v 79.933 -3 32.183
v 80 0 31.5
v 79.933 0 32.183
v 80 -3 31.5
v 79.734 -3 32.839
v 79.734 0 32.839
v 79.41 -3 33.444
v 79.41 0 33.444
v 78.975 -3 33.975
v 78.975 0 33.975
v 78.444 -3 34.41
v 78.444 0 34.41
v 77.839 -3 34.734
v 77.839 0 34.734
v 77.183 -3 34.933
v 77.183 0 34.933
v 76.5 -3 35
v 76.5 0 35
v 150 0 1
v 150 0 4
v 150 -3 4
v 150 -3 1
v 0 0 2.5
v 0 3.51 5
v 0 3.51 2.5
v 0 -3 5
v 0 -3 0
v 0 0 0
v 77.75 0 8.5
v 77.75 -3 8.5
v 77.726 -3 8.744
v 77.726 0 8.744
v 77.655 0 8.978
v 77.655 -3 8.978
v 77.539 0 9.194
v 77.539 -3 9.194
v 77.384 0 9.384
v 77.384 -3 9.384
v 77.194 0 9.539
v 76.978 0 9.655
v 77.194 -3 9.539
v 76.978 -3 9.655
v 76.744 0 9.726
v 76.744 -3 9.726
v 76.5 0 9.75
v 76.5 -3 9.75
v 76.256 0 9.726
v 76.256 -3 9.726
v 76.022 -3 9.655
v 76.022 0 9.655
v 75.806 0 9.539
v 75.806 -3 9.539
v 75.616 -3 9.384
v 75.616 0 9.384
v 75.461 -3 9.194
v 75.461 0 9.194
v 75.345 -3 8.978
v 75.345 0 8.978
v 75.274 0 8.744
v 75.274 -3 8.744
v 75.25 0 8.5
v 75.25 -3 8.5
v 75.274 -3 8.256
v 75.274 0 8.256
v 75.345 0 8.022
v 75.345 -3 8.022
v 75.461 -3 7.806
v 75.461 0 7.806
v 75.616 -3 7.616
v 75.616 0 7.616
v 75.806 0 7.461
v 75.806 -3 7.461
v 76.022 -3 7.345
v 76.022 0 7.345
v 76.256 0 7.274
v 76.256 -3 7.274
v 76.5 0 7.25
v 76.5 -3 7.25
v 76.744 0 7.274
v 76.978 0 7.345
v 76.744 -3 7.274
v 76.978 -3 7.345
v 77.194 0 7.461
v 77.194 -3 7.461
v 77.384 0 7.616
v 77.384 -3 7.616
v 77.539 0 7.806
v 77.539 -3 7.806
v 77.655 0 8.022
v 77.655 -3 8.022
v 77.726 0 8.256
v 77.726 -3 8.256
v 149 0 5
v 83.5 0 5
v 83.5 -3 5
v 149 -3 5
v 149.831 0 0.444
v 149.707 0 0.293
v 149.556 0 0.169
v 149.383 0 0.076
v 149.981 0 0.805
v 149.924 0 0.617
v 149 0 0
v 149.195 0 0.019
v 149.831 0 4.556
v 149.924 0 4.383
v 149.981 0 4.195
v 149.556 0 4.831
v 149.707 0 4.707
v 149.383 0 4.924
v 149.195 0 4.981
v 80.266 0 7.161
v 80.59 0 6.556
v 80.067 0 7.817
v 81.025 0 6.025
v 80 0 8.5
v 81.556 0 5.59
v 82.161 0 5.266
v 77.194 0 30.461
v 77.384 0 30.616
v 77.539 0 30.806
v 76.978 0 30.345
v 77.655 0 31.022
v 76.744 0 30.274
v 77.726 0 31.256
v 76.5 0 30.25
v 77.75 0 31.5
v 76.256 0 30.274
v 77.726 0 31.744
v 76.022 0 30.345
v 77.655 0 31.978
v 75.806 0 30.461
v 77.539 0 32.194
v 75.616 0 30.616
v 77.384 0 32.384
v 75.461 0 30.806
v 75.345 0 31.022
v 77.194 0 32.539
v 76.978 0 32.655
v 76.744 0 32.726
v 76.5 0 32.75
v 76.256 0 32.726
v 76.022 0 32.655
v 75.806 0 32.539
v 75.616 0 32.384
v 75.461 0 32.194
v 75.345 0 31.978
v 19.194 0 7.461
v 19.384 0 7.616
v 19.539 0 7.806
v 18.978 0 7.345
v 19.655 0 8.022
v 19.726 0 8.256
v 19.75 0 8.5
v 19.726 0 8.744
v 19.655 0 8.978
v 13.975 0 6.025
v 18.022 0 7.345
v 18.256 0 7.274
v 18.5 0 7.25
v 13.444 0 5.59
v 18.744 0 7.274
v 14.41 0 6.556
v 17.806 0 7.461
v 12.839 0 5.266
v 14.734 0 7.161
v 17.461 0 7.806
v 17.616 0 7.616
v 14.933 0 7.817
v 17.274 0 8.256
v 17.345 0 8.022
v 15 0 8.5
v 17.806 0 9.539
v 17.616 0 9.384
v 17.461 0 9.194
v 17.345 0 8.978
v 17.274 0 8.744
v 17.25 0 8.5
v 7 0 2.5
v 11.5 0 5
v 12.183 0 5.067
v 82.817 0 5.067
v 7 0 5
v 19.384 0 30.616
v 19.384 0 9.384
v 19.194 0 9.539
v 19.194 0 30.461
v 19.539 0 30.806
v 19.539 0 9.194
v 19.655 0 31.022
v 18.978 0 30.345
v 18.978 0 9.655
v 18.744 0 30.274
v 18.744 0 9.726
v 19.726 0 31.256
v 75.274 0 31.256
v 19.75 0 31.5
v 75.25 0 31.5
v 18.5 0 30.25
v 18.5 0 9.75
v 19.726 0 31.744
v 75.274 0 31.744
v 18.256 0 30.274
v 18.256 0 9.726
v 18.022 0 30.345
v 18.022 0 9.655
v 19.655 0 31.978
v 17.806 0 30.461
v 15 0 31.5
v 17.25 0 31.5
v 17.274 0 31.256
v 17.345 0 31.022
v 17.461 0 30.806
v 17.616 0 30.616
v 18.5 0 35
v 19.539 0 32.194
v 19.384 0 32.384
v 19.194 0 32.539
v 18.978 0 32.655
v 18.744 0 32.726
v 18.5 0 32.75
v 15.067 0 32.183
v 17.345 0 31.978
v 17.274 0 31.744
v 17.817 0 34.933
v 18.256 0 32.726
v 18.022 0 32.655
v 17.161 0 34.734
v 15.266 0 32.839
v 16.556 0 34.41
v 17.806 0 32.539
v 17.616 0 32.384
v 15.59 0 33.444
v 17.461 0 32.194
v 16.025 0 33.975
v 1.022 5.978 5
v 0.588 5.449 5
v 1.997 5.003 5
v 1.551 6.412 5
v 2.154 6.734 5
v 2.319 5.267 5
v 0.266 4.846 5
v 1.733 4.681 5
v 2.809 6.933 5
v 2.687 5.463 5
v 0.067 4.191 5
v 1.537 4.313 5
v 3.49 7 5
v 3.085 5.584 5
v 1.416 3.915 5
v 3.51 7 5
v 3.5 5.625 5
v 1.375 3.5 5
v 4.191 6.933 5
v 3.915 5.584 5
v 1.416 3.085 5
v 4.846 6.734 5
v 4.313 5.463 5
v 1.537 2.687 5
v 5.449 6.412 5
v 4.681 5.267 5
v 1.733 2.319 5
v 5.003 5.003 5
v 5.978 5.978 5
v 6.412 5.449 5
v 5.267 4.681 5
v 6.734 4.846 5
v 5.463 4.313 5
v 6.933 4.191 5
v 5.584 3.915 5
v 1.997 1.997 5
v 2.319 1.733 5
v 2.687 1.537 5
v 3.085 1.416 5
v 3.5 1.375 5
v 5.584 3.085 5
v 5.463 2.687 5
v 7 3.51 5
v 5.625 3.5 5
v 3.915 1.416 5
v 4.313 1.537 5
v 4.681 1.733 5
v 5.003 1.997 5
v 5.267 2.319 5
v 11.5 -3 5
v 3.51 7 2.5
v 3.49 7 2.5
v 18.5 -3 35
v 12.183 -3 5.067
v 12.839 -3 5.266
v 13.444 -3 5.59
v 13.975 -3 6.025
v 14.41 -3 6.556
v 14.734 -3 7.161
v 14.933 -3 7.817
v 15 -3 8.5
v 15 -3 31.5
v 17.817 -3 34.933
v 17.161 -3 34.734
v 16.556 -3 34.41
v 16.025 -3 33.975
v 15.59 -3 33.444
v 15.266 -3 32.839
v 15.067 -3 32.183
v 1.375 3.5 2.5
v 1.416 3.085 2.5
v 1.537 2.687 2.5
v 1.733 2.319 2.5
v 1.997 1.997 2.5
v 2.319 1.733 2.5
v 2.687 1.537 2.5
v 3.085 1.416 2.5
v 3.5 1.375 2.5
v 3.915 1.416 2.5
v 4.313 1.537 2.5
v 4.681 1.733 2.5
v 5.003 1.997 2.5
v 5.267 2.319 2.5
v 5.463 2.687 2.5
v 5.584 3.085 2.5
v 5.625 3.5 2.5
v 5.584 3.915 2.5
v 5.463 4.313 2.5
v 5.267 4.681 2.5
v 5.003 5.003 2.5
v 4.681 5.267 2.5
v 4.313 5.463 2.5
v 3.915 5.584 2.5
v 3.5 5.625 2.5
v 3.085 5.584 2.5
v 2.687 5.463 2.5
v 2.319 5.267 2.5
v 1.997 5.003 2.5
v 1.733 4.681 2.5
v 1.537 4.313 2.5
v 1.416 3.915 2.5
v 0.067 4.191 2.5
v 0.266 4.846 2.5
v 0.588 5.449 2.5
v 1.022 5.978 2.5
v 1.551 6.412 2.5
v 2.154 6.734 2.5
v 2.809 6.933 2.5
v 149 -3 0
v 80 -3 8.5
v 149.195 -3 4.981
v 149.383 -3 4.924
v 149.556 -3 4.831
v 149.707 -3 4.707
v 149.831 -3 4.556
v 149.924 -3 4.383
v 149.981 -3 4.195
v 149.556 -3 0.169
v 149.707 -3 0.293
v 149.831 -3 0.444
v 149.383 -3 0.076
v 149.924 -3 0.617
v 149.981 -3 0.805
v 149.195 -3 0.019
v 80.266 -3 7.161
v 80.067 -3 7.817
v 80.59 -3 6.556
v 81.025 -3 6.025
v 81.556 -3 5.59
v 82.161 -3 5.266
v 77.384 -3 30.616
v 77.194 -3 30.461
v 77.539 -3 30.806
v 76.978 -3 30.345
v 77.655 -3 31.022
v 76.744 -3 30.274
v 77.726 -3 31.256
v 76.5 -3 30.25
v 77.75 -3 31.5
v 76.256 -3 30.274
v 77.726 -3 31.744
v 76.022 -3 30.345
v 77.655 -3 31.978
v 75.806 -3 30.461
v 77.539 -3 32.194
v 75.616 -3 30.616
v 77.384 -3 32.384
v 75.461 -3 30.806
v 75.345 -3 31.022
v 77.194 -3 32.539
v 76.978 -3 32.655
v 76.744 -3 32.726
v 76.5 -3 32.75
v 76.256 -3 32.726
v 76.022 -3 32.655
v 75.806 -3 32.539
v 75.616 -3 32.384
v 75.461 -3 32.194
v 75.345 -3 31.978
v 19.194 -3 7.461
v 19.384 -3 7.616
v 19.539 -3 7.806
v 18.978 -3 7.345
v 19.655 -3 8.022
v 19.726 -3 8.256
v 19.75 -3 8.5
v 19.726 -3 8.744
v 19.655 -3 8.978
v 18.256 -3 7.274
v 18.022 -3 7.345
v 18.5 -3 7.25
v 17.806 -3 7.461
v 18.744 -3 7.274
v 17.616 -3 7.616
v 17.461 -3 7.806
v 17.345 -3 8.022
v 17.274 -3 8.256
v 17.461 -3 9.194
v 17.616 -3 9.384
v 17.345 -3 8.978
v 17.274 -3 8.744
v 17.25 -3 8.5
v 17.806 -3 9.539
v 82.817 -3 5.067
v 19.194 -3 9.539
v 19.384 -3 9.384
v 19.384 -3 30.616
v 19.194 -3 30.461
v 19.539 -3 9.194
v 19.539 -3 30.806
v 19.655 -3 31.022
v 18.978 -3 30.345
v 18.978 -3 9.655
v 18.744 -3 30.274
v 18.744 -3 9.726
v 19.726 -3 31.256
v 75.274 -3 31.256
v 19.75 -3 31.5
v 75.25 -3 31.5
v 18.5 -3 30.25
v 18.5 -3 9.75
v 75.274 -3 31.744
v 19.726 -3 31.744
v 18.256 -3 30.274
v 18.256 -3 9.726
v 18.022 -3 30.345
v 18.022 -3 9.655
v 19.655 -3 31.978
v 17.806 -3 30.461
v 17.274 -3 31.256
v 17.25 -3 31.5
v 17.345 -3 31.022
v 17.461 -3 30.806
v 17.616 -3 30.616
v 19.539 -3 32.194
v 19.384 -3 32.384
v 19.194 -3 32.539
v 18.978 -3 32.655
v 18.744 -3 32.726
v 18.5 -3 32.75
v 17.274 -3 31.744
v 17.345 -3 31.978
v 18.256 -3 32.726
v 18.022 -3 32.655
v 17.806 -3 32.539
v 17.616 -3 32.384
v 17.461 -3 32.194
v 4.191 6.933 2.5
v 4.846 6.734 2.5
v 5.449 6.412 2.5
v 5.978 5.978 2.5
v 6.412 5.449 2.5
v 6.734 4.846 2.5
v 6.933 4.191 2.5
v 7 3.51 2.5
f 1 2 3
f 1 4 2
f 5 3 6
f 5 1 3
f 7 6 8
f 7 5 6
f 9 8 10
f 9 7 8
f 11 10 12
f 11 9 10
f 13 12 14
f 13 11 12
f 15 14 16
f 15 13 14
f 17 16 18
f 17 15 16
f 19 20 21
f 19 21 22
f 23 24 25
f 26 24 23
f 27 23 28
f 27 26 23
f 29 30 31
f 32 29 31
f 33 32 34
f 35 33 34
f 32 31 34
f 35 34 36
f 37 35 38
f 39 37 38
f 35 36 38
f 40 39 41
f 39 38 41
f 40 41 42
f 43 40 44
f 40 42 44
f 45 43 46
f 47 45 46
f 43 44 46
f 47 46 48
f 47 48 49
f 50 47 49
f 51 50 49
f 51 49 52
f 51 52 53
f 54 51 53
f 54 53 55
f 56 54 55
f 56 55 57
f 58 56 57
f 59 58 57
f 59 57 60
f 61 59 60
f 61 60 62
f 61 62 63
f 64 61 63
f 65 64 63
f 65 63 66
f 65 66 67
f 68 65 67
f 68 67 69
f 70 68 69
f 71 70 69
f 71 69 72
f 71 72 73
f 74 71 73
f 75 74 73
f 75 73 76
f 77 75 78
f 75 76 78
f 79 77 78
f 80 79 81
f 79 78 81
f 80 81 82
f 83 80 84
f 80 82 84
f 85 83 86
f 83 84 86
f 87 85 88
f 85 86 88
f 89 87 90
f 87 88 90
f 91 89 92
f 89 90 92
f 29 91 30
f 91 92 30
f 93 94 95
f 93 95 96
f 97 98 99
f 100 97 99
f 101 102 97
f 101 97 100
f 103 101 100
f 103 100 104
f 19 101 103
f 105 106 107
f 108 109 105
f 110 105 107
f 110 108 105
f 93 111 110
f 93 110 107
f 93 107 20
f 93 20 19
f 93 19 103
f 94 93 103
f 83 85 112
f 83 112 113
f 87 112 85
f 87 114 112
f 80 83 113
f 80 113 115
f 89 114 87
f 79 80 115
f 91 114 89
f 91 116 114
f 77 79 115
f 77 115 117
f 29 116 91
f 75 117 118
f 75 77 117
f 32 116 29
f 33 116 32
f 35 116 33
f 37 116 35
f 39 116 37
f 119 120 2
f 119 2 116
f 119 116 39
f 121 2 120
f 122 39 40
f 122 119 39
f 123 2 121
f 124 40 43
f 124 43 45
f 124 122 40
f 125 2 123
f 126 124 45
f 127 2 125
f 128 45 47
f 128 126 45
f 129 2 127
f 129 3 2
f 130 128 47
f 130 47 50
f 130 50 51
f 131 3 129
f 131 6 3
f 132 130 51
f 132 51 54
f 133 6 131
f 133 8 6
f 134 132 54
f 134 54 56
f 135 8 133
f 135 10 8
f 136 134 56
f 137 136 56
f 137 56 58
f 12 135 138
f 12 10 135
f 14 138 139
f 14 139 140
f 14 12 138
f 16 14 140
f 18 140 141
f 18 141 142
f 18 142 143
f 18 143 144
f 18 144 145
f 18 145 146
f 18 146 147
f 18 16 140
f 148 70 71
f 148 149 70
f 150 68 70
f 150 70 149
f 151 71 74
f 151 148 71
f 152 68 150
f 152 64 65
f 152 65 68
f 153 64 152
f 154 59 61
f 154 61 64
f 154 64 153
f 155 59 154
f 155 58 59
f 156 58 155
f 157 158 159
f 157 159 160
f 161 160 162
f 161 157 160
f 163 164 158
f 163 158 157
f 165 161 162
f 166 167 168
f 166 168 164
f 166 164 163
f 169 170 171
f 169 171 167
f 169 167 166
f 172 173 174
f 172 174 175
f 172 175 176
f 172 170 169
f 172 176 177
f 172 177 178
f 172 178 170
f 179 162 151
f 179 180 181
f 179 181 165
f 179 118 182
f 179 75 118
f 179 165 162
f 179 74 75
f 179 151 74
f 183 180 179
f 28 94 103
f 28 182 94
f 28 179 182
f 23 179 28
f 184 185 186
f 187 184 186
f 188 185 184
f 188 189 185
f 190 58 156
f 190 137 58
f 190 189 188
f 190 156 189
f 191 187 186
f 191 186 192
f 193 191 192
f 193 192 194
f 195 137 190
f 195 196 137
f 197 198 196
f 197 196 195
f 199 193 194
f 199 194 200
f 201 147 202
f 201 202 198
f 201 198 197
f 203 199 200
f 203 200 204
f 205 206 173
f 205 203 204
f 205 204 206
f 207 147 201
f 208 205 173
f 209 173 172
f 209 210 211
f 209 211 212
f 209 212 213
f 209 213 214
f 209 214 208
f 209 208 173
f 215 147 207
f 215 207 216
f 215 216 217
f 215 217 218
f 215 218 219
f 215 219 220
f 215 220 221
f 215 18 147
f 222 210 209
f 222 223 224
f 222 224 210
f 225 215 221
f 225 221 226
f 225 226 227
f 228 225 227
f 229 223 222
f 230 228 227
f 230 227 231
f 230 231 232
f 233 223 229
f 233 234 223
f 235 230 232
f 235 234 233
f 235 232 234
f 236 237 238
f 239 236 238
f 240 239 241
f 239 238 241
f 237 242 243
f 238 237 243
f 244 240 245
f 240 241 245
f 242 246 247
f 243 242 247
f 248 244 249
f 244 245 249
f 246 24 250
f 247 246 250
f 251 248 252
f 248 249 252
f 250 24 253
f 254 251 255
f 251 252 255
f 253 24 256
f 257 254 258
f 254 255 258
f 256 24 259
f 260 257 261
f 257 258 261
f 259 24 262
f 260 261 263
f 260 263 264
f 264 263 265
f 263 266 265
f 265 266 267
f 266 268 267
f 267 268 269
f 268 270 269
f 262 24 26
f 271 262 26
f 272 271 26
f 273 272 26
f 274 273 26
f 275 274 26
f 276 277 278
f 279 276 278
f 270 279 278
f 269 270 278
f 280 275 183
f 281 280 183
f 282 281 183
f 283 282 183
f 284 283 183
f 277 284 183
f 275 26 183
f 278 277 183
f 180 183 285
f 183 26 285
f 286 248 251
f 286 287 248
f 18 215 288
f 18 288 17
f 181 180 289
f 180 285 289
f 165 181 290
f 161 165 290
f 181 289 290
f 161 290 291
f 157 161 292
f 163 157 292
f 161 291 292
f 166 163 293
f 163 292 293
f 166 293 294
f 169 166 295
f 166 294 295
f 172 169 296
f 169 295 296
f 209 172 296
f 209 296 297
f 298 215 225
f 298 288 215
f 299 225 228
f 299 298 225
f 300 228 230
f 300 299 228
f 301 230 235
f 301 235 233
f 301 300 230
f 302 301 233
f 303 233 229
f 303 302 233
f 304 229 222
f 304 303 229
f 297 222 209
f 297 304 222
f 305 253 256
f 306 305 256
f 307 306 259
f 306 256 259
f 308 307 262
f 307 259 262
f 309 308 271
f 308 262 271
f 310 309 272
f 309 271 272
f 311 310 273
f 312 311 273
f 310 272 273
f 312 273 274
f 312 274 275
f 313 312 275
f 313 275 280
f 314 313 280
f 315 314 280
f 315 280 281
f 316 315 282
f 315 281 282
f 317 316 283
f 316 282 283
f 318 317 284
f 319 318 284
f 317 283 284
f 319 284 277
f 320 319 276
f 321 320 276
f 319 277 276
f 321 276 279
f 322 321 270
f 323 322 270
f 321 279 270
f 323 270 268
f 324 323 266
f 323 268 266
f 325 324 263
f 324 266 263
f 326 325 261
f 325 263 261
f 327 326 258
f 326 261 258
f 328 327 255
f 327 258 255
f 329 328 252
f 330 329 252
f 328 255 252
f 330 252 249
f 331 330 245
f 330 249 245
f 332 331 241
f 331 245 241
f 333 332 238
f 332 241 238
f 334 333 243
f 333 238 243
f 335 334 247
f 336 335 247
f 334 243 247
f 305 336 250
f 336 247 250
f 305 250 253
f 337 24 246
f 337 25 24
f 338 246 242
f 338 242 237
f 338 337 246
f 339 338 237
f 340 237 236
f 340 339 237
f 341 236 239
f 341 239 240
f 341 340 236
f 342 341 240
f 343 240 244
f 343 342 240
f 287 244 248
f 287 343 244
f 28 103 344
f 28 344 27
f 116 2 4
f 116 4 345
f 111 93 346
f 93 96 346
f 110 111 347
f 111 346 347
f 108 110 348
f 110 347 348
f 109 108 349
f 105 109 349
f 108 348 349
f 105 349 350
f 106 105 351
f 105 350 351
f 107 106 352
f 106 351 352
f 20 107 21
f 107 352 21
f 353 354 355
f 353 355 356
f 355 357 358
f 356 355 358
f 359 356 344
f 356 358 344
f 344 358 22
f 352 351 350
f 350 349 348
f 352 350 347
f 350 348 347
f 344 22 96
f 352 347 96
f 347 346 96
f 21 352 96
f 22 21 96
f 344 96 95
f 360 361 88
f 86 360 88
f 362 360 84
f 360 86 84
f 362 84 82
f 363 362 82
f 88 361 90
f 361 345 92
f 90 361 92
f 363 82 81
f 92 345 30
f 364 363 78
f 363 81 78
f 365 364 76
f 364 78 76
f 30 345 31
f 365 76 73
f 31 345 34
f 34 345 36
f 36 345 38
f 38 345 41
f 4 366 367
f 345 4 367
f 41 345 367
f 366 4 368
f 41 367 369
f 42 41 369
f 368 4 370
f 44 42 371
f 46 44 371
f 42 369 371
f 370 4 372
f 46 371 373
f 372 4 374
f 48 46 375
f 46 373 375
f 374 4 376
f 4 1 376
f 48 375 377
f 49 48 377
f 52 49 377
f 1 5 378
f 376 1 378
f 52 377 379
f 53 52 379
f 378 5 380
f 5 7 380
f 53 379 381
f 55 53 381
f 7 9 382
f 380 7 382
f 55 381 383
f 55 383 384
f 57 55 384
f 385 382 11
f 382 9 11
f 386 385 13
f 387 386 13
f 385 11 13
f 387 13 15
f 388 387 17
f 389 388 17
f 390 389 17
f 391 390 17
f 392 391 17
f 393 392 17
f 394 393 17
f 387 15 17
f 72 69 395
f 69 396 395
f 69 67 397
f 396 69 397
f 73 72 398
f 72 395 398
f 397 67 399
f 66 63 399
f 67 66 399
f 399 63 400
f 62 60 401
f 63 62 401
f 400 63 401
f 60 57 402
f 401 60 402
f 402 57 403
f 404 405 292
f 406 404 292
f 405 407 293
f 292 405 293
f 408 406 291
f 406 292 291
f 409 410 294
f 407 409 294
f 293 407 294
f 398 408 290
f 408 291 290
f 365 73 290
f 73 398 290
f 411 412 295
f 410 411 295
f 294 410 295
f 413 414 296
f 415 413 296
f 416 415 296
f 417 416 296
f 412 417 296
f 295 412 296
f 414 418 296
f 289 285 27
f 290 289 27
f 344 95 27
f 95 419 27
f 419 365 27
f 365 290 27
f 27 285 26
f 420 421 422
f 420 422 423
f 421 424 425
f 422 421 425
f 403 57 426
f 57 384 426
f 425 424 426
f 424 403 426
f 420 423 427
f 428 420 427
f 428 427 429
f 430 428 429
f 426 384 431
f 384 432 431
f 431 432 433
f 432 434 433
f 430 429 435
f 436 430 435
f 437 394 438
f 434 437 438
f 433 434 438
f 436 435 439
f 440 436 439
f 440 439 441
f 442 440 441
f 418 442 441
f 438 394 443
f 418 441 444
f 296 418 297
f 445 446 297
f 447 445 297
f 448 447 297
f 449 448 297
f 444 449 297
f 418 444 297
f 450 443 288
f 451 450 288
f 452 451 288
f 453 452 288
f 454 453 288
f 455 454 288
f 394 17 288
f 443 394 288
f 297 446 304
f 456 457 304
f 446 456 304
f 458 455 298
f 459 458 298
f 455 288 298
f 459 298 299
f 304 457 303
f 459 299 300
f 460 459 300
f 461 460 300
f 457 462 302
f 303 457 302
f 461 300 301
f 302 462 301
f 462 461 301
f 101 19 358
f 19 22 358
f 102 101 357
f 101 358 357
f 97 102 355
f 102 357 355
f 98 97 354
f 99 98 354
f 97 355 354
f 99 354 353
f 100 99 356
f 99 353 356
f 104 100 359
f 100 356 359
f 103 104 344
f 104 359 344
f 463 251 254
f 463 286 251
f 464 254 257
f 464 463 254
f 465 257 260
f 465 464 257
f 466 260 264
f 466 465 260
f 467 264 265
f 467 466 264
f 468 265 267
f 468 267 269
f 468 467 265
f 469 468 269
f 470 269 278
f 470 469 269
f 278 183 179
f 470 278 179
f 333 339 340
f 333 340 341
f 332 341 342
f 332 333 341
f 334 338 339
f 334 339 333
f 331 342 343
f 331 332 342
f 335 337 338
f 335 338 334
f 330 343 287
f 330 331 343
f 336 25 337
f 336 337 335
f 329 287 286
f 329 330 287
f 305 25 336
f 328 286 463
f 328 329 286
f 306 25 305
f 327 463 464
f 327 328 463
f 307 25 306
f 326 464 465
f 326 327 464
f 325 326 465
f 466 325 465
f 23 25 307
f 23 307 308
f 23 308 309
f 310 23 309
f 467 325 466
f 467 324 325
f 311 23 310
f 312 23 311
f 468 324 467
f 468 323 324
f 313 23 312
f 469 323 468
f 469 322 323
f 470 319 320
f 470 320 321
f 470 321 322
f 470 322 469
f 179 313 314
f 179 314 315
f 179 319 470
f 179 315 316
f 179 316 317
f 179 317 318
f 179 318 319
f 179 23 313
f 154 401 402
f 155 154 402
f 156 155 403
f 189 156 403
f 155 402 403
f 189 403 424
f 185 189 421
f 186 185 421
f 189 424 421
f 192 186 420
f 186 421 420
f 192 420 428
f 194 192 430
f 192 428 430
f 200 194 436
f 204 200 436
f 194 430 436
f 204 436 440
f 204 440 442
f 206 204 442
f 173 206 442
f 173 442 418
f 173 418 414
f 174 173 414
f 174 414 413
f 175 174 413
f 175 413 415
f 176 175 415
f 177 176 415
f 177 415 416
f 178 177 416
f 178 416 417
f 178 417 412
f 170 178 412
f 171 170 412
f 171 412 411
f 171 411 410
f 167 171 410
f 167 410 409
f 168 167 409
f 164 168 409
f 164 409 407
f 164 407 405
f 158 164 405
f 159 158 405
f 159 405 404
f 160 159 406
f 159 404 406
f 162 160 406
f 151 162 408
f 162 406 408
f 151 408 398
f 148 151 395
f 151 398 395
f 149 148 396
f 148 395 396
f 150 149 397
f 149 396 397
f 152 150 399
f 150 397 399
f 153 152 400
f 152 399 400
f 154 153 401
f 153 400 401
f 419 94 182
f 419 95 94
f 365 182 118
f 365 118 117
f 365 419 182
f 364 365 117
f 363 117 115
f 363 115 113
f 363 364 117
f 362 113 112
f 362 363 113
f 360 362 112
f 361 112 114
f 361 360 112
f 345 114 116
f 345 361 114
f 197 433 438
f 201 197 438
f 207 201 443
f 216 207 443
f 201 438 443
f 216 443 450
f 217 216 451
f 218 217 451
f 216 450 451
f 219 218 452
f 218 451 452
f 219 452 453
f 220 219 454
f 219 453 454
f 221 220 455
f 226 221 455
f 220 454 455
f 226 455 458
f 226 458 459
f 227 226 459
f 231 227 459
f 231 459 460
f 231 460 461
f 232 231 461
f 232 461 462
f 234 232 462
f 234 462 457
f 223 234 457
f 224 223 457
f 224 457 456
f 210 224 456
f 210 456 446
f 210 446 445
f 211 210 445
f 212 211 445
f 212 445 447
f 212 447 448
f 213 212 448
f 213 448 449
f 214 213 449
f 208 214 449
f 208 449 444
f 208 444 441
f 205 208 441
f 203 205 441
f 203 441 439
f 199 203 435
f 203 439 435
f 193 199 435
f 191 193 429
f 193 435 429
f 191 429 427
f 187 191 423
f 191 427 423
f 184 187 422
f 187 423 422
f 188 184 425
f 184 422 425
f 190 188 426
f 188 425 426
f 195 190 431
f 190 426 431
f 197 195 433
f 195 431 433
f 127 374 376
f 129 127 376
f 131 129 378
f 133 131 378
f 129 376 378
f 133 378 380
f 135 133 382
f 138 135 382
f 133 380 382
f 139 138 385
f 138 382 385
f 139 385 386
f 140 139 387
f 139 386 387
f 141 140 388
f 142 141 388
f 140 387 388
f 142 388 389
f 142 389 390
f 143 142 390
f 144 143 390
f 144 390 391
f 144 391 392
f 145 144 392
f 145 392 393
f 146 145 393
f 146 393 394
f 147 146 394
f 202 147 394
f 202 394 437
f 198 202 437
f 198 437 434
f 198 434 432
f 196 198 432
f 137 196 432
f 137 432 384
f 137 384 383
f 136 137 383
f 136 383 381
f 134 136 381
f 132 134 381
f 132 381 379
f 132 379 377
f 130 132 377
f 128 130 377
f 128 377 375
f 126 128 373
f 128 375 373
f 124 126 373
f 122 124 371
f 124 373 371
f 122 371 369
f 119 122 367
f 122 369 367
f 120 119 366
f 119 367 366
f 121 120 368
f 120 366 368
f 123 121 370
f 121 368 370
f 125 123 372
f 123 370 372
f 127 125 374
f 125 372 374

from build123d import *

# Parameters (mm, degrees)
PAD_DEPTH       = 3
SKETCH001_W     = 7
SKETCH001_H     = 2.5
PAD001_DEPTH    = 7
SKETCH002_R     = 2.125
POCKET_DEPTH    = 2.5
FILLET_R        = 3.49
FILLET001_R     = 3.5
FILLET002_R     = 1
SKETCH003_R     = 1.25
POCKET001_DEPTH = 25


with BuildPart() as part:
    # Sketch → Pad (new body)
    with BuildSketch(Plane.XZ):
        Polygon((0, 0), (0, 5), (15, 5), (15, 35), (80, 35), (80, 5), (150, 5), (150, 0), align=None)
    extrude(amount=PAD_DEPTH)

    # Sketch001 (on Face9 of Pad) → Pad001 (join)
    with BuildSketch(Plane(origin=(0, 0, 0), x_dir=(1, 0, 0), z_dir=(0, 1, 0))):
        with Locations((3.5, -3.75)):
            Rectangle(SKETCH001_W, SKETCH001_H)
    extrude(amount=PAD001_DEPTH)

    # Sketch002 (on Face9 of Pad001) → Pocket (cut)
    with BuildSketch(Plane(origin=(0, 0, 5), x_dir=(-1, 0, 0), z_dir=(0, 0, 1))):
        with Locations((-3.5, -3.5)):
            Circle(SKETCH002_R)
    extrude(amount=-POCKET_DEPTH, mode=Mode.SUBTRACT)

    # Fillet
    fillet_edges = [part.edges().sort_by_distance(p)[0] for p in [
        (0, 7, 3.75),
        (7, 7, 3.75),
    ]]
    fillet(fillet_edges, radius=FILLET_R)

    # Fillet001
    fillet001_edges = [part.edges().sort_by_distance(p)[0] for p in [
        (15, -1.5, 35),
        (15, -1.5, 5),
        (80, -1.5, 5),
        (80, -1.5, 35),
    ]]
    fillet(fillet001_edges, radius=FILLET001_R)

    # Fillet002
    fillet002_edges = [part.edges().sort_by_distance(p)[0] for p in [
        (150, -1.5, 5),
        (150, -1.5, 0),
    ]]
    fillet(fillet002_edges, radius=FILLET002_R)

    # Sketch003 (on Face13 of Fillet) → Pocket001 (cut)
    with BuildSketch(Plane.XZ.offset(3)):
        with Locations((18.5, 31.5)):
            Circle(SKETCH003_R)
        with Locations((18.5, 8.5)):
            Circle(SKETCH003_R)
        with Locations((76.5, 8.5)):
            Circle(SKETCH003_R)
        with Locations((76.5, 31.5)):
            Circle(SKETCH003_R)
    extrude(amount=-POCKET001_DEPTH, mode=Mode.SUBTRACT)


solid = part.part
